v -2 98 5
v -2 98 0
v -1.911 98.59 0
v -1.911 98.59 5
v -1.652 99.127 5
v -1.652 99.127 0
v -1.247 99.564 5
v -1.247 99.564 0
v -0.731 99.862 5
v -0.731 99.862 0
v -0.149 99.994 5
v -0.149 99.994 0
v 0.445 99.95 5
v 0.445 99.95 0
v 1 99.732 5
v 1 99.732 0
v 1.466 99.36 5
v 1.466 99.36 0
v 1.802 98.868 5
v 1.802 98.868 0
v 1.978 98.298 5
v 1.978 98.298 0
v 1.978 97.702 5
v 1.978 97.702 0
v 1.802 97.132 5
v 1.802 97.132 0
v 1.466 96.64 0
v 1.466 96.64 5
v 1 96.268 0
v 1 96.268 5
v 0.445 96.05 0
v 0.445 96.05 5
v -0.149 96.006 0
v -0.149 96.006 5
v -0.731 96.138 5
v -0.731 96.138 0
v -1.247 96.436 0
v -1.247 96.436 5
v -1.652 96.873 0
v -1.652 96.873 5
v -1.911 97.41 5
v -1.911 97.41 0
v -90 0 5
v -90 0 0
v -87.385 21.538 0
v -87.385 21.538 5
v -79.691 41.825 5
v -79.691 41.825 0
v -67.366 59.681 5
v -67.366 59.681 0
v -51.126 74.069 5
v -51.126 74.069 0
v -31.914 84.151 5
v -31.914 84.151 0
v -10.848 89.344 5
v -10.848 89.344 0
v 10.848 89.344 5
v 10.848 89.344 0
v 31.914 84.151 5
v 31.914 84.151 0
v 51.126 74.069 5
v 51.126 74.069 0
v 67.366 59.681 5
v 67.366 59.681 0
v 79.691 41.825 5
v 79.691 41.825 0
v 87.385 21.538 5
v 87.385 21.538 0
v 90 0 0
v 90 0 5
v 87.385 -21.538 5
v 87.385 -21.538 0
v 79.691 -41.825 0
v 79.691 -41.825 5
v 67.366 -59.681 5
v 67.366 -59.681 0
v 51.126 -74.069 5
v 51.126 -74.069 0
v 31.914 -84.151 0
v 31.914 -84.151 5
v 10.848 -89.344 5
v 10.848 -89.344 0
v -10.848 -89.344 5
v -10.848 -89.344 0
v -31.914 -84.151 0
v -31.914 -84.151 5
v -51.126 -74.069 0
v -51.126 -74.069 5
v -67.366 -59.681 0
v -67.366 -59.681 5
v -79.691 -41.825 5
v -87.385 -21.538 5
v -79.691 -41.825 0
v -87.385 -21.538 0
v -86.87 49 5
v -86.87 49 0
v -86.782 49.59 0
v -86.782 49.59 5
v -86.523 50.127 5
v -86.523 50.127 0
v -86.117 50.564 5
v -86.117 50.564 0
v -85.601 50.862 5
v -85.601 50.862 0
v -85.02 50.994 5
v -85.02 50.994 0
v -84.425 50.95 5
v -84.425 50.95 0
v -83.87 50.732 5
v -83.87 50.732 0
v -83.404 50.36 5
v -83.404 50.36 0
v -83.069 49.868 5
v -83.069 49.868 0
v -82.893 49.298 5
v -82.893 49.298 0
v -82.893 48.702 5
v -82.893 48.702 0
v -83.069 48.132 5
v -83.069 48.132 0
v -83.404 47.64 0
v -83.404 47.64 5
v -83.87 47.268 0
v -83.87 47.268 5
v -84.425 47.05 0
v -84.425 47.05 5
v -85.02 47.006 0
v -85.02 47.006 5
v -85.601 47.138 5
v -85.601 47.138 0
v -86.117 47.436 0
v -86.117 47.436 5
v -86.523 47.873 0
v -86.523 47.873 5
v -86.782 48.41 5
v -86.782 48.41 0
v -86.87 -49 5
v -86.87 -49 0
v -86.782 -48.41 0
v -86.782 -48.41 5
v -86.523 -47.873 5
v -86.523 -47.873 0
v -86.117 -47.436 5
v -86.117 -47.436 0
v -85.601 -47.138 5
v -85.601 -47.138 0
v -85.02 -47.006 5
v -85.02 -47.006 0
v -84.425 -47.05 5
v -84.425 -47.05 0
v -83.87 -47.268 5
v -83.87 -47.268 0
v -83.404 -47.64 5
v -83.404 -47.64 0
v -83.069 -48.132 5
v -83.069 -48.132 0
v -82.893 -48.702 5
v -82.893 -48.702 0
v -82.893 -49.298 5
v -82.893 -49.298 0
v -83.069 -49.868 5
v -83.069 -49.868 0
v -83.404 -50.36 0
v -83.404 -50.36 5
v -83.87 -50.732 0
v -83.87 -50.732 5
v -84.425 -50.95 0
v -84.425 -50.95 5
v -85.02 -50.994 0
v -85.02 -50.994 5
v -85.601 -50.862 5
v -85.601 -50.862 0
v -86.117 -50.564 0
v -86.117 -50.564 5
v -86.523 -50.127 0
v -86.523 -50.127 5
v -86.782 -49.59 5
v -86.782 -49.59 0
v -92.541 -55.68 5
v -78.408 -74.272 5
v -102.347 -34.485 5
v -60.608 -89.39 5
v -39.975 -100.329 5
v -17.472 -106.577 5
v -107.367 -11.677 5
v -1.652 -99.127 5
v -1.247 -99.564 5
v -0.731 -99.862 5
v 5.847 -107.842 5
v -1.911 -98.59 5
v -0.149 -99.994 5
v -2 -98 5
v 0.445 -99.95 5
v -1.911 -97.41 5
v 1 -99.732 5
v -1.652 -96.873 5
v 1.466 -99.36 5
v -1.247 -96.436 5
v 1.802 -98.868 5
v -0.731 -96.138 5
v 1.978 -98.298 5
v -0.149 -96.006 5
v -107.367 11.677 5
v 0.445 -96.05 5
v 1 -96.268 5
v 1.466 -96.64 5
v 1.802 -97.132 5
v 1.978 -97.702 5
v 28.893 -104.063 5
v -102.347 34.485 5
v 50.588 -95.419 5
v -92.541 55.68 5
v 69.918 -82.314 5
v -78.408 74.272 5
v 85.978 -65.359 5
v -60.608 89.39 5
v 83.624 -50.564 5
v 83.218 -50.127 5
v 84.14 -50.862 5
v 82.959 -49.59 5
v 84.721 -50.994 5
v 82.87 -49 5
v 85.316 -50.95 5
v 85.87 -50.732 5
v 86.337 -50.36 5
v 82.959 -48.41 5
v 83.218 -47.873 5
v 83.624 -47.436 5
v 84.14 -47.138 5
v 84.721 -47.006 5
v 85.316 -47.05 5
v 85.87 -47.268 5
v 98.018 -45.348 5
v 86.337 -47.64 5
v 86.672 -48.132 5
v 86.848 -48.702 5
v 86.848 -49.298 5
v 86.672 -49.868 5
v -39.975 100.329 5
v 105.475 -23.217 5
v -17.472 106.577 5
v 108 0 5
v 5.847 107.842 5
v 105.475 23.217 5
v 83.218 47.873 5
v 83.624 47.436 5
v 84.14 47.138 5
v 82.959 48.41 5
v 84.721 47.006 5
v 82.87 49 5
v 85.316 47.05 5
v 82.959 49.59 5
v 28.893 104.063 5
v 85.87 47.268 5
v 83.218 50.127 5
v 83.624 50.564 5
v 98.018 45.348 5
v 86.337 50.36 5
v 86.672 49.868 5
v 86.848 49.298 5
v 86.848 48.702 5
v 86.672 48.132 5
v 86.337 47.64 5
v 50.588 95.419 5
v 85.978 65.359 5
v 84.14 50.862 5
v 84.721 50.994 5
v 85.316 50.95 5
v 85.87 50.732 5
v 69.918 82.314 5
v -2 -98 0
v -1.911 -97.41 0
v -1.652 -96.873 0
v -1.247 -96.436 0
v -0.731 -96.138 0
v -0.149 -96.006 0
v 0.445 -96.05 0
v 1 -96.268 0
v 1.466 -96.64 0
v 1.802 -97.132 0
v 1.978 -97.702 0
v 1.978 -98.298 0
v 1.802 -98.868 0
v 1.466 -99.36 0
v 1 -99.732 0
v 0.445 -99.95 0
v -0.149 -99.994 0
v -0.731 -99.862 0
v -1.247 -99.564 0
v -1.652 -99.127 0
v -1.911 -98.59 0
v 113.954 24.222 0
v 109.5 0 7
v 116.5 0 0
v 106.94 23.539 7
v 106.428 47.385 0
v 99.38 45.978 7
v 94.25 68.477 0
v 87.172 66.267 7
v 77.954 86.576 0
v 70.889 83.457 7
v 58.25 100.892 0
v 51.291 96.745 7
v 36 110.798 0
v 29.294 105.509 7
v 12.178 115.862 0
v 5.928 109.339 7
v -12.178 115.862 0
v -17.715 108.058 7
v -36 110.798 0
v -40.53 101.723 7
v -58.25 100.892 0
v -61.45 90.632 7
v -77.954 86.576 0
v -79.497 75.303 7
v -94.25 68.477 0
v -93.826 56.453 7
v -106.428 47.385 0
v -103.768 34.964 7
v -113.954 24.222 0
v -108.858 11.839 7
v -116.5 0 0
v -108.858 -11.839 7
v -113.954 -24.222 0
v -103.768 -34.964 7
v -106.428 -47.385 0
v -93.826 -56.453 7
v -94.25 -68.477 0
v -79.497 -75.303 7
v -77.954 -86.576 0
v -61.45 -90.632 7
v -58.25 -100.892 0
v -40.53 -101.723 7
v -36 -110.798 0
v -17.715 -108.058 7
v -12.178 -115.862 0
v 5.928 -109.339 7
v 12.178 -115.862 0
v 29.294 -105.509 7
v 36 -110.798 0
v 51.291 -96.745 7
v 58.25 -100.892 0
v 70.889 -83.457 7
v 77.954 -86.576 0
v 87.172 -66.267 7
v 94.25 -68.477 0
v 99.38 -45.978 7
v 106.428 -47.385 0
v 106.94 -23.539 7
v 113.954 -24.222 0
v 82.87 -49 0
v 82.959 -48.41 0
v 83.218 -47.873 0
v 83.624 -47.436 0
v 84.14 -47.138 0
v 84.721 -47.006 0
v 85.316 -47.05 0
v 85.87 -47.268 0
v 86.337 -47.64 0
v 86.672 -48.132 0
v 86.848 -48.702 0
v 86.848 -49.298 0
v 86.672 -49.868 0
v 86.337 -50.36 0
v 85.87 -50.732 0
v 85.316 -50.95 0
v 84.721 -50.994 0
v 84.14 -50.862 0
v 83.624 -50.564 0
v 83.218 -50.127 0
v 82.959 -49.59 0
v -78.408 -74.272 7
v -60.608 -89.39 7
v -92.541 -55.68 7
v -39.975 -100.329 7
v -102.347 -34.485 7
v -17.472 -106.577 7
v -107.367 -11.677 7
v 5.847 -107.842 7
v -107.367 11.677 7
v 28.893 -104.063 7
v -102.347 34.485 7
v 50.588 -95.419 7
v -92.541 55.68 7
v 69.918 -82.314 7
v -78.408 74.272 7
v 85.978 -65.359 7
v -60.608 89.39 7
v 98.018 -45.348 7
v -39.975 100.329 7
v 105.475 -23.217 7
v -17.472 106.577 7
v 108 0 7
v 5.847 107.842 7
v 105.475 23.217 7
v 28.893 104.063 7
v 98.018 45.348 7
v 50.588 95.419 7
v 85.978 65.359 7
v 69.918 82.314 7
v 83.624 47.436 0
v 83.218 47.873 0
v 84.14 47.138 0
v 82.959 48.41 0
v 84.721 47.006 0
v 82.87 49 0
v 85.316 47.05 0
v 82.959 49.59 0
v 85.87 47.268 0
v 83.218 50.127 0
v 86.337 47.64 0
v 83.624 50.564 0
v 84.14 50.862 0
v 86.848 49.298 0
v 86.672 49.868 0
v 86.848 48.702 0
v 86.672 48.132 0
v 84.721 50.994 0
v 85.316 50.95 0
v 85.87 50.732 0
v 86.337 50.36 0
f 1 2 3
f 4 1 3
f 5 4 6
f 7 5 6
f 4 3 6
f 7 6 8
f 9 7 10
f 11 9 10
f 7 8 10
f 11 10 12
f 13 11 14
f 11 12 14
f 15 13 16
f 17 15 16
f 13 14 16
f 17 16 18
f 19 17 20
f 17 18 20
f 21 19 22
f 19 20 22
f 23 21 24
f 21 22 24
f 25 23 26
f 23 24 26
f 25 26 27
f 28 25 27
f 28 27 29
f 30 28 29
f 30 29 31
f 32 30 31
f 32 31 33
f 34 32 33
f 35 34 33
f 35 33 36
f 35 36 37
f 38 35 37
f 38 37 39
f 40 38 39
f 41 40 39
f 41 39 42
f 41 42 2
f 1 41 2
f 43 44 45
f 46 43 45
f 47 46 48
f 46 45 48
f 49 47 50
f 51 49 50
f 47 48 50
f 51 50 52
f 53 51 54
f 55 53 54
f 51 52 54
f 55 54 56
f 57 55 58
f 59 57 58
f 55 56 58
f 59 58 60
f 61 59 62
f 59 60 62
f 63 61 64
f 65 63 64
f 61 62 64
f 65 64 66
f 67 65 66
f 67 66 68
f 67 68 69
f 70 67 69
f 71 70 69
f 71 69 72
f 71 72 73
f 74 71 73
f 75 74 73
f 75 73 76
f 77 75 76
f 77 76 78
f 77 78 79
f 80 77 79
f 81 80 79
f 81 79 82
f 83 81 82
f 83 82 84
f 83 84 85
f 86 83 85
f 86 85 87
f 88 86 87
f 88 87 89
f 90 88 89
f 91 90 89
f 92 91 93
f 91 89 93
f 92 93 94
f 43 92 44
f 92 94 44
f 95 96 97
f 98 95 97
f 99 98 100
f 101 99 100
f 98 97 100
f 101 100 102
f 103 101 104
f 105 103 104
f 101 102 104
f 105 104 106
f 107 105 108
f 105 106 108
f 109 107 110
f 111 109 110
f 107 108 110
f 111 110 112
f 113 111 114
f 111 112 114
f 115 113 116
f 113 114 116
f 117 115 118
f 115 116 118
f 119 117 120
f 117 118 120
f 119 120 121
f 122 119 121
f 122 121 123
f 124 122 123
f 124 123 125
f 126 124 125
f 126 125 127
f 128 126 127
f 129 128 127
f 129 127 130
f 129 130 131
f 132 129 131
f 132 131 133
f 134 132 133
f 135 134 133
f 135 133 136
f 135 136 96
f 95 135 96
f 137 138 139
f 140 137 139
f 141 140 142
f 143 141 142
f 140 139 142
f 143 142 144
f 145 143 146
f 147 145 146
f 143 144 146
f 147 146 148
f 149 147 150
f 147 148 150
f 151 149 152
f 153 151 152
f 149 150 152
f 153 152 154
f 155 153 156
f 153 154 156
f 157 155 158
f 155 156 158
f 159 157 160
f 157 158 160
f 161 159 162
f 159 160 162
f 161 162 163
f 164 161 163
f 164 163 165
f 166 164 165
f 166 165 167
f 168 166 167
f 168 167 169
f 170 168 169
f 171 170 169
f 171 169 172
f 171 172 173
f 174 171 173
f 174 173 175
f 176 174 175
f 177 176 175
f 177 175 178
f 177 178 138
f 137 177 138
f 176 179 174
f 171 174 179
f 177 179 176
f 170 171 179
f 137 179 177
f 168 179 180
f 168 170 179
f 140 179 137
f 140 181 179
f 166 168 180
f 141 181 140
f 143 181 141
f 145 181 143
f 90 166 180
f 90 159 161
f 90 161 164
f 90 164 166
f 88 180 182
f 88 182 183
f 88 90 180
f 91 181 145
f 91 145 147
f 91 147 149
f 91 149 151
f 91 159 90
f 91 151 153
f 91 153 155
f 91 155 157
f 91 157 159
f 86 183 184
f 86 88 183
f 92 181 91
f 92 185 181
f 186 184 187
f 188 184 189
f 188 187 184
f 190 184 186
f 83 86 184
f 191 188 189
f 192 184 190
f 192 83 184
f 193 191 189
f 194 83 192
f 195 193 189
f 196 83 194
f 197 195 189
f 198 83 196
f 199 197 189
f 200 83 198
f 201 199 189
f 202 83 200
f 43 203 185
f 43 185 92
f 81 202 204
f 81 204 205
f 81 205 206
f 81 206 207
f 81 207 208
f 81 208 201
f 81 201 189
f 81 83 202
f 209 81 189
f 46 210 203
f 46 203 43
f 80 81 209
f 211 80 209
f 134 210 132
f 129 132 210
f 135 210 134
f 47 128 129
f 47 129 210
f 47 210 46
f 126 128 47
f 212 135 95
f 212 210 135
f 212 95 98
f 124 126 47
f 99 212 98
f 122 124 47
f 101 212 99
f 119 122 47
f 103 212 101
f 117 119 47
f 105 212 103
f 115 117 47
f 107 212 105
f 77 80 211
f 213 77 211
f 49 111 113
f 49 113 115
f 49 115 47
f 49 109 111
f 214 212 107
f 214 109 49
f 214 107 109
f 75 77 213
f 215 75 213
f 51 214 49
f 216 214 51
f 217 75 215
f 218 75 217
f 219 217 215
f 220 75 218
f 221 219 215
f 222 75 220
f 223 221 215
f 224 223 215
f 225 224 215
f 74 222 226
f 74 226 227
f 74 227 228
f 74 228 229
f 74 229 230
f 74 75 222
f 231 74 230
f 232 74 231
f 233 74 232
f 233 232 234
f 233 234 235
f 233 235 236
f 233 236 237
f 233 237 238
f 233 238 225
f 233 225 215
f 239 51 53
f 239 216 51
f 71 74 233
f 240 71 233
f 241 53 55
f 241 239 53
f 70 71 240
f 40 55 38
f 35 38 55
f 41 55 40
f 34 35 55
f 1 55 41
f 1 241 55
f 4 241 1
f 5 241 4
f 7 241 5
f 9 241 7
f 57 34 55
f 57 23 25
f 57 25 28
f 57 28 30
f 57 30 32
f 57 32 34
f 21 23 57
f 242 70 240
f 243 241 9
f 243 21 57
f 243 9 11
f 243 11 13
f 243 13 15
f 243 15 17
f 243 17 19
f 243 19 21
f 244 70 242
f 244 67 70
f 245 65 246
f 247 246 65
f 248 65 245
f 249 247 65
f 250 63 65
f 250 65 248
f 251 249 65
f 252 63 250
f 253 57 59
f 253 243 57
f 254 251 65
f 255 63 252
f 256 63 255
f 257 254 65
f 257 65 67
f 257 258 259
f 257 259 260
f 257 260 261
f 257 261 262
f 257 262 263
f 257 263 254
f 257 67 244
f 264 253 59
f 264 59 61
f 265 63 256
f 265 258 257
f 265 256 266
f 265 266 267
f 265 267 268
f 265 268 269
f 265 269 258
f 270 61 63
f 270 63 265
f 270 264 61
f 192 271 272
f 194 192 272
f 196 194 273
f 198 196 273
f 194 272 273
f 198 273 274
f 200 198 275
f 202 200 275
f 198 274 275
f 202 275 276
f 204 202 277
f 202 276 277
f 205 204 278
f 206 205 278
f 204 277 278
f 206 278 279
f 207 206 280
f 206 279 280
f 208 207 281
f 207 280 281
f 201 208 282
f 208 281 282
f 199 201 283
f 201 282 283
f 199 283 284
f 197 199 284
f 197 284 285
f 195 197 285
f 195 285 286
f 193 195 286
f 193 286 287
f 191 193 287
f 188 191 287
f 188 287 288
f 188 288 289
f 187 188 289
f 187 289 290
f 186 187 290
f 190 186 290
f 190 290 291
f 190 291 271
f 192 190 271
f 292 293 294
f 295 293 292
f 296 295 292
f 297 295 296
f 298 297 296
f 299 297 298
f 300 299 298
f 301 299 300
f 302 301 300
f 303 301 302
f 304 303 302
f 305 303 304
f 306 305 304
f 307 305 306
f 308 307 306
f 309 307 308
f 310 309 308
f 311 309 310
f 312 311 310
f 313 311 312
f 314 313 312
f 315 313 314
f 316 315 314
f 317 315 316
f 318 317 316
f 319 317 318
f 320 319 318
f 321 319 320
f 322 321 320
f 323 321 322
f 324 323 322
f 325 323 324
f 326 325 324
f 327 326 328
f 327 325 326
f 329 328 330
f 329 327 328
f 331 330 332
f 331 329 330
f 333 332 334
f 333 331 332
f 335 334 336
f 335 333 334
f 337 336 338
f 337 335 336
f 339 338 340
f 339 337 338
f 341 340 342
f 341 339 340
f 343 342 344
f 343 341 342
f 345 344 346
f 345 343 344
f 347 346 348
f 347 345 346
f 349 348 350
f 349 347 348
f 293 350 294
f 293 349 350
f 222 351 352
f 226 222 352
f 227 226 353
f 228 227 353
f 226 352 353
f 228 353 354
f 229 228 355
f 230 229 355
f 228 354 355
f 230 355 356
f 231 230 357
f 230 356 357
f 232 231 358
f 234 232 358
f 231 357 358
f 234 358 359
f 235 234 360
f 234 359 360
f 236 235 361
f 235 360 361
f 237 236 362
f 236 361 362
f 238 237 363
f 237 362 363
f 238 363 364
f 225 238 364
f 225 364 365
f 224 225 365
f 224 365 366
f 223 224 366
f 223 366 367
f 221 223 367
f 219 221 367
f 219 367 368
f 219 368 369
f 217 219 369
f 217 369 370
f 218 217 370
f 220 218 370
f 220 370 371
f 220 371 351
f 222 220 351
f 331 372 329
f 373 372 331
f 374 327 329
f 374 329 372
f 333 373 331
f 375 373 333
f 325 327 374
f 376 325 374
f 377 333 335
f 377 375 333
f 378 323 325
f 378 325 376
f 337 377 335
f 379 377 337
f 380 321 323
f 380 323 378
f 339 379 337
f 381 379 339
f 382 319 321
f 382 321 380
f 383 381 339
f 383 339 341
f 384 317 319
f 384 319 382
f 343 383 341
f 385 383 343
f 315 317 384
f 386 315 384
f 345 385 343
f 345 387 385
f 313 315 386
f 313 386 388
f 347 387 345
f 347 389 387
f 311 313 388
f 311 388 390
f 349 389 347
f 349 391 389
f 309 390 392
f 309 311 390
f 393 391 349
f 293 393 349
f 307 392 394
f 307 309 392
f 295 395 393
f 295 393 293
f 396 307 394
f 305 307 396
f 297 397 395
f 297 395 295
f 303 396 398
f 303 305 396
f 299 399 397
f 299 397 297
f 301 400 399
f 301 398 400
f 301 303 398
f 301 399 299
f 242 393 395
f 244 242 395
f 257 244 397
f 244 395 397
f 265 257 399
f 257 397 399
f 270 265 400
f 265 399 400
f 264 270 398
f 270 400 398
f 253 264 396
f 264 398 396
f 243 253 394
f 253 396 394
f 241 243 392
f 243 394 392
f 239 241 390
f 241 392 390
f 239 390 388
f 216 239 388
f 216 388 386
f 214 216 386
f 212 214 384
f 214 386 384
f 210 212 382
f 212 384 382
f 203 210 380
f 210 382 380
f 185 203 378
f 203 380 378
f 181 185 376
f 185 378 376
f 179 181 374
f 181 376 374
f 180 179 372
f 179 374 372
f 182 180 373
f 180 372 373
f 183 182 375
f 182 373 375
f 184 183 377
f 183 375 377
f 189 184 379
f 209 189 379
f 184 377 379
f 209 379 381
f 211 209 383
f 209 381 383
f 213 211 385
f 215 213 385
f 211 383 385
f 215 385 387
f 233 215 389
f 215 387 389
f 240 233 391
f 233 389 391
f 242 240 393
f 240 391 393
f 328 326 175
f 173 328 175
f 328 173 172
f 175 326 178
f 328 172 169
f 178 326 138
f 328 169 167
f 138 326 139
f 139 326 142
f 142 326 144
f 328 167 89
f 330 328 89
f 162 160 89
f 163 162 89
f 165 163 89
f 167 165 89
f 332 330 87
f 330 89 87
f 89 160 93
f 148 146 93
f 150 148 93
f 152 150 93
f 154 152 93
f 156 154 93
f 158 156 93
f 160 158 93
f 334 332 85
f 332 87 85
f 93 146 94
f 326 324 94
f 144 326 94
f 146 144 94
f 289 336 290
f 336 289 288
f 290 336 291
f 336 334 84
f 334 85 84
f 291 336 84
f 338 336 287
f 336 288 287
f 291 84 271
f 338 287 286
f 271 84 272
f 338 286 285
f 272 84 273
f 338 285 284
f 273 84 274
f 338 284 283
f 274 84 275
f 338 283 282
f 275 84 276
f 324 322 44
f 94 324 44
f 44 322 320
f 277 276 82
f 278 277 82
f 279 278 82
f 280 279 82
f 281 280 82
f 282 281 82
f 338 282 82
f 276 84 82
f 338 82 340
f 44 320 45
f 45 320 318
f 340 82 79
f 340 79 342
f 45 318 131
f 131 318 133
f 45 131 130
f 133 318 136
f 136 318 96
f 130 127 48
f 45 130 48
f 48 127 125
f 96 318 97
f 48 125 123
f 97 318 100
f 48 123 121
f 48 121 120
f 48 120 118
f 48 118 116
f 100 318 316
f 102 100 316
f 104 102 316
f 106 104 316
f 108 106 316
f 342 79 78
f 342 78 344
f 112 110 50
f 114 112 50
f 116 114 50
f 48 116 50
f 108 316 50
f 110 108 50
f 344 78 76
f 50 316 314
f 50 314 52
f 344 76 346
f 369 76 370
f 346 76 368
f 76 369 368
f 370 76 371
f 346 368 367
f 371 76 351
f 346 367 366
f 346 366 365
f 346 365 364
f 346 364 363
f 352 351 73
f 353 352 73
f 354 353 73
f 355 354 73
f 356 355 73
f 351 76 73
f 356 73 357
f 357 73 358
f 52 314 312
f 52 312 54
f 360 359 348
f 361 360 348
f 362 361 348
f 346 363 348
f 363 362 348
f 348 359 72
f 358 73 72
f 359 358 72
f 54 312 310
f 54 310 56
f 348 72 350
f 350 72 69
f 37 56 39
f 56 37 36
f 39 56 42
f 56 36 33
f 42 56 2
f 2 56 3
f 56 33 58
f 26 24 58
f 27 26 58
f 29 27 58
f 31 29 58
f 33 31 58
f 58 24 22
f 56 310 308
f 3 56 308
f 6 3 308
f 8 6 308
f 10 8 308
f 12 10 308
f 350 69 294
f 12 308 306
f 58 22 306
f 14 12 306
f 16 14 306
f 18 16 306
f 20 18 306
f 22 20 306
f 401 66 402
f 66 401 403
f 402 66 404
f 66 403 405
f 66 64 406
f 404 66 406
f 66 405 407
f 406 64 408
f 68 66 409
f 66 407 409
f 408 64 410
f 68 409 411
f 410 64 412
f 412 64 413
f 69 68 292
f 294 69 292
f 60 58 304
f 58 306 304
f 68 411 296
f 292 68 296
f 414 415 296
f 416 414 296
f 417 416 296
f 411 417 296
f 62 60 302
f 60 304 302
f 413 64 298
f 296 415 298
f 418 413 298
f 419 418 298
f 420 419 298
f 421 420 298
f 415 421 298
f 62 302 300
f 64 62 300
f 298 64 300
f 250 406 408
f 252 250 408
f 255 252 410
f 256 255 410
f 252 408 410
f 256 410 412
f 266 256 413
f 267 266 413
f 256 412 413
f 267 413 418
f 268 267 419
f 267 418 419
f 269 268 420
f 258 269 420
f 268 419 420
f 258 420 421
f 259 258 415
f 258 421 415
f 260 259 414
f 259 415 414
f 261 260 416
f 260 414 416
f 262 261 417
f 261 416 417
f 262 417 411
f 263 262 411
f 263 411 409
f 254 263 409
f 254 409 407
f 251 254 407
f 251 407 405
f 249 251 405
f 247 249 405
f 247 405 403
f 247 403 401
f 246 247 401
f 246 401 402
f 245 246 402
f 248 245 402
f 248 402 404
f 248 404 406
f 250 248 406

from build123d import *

# Parameters (mm, degrees)
SKETCH1_R           = 119.5
BOSS_EXTRUDE1_DEPTH = 7
CHAMFER2_SIZE       = 10
SKETCH3_R           = 108
CUT_EXTRUDE1_DEPTH  = 2
SKETCH4_R           = 90
SKETCH4_R_2         = 2
CUT_EXTRUDE2_DEPTH  = 165.904517828


with BuildPart() as part:
    # Sketch1 → Boss-Extrude1 (new body)
    with BuildSketch(Plane.XY):
        Circle(SKETCH1_R)
    extrude(amount=BOSS_EXTRUDE1_DEPTH)

    # Chamfer2
    # the kernel refuses this chamfer: 10 mm, written as the material it takes off along each edge
    with BuildSketch(Plane(origin=(0, 0, 7), x_dir=(1, 0, 0), z_dir=(0, -1, 0))) as chamfer2_piece_1:
        Polygon((119.5, -CHAMFER2_SIZE), (119.5 - CHAMFER2_SIZE, 0), (119.5, 0), align=None)
    revolve(axis=Axis((0, 0, 7), (0, 0, 1)), mode=Mode.SUBTRACT)

    # Sketch3 → Cut-Extrude1 (cut)
    with BuildSketch(Plane.XY.offset(7)):
        Circle(SKETCH3_R)
    extrude(amount=-CUT_EXTRUDE1_DEPTH, mode=Mode.SUBTRACT)

    # Sketch4 → Cut-Extrude2 (cut, through all)
    with BuildSketch(Plane(origin=(0, 0, 0), x_dir=(-1, 0, 0), z_dir=(0, 0, -1))):
        Circle(SKETCH4_R)
        with Locations((0, 98)):
            Circle(SKETCH4_R_2)
        with Locations((84.870489571, 49)):
            Circle(SKETCH4_R_2)
        with Locations((84.870489571, -49)):
            Circle(SKETCH4_R_2)
        with Locations((0, -98)):
            Circle(SKETCH4_R_2)
        with Locations((-84.870489571, -49)):
            Circle(SKETCH4_R_2)
        with Locations((-84.870489571, 49)):
            Circle(SKETCH4_R_2)
    extrude(amount=-CUT_EXTRUDE2_DEPTH, mode=Mode.SUBTRACT)


solid = part.part
